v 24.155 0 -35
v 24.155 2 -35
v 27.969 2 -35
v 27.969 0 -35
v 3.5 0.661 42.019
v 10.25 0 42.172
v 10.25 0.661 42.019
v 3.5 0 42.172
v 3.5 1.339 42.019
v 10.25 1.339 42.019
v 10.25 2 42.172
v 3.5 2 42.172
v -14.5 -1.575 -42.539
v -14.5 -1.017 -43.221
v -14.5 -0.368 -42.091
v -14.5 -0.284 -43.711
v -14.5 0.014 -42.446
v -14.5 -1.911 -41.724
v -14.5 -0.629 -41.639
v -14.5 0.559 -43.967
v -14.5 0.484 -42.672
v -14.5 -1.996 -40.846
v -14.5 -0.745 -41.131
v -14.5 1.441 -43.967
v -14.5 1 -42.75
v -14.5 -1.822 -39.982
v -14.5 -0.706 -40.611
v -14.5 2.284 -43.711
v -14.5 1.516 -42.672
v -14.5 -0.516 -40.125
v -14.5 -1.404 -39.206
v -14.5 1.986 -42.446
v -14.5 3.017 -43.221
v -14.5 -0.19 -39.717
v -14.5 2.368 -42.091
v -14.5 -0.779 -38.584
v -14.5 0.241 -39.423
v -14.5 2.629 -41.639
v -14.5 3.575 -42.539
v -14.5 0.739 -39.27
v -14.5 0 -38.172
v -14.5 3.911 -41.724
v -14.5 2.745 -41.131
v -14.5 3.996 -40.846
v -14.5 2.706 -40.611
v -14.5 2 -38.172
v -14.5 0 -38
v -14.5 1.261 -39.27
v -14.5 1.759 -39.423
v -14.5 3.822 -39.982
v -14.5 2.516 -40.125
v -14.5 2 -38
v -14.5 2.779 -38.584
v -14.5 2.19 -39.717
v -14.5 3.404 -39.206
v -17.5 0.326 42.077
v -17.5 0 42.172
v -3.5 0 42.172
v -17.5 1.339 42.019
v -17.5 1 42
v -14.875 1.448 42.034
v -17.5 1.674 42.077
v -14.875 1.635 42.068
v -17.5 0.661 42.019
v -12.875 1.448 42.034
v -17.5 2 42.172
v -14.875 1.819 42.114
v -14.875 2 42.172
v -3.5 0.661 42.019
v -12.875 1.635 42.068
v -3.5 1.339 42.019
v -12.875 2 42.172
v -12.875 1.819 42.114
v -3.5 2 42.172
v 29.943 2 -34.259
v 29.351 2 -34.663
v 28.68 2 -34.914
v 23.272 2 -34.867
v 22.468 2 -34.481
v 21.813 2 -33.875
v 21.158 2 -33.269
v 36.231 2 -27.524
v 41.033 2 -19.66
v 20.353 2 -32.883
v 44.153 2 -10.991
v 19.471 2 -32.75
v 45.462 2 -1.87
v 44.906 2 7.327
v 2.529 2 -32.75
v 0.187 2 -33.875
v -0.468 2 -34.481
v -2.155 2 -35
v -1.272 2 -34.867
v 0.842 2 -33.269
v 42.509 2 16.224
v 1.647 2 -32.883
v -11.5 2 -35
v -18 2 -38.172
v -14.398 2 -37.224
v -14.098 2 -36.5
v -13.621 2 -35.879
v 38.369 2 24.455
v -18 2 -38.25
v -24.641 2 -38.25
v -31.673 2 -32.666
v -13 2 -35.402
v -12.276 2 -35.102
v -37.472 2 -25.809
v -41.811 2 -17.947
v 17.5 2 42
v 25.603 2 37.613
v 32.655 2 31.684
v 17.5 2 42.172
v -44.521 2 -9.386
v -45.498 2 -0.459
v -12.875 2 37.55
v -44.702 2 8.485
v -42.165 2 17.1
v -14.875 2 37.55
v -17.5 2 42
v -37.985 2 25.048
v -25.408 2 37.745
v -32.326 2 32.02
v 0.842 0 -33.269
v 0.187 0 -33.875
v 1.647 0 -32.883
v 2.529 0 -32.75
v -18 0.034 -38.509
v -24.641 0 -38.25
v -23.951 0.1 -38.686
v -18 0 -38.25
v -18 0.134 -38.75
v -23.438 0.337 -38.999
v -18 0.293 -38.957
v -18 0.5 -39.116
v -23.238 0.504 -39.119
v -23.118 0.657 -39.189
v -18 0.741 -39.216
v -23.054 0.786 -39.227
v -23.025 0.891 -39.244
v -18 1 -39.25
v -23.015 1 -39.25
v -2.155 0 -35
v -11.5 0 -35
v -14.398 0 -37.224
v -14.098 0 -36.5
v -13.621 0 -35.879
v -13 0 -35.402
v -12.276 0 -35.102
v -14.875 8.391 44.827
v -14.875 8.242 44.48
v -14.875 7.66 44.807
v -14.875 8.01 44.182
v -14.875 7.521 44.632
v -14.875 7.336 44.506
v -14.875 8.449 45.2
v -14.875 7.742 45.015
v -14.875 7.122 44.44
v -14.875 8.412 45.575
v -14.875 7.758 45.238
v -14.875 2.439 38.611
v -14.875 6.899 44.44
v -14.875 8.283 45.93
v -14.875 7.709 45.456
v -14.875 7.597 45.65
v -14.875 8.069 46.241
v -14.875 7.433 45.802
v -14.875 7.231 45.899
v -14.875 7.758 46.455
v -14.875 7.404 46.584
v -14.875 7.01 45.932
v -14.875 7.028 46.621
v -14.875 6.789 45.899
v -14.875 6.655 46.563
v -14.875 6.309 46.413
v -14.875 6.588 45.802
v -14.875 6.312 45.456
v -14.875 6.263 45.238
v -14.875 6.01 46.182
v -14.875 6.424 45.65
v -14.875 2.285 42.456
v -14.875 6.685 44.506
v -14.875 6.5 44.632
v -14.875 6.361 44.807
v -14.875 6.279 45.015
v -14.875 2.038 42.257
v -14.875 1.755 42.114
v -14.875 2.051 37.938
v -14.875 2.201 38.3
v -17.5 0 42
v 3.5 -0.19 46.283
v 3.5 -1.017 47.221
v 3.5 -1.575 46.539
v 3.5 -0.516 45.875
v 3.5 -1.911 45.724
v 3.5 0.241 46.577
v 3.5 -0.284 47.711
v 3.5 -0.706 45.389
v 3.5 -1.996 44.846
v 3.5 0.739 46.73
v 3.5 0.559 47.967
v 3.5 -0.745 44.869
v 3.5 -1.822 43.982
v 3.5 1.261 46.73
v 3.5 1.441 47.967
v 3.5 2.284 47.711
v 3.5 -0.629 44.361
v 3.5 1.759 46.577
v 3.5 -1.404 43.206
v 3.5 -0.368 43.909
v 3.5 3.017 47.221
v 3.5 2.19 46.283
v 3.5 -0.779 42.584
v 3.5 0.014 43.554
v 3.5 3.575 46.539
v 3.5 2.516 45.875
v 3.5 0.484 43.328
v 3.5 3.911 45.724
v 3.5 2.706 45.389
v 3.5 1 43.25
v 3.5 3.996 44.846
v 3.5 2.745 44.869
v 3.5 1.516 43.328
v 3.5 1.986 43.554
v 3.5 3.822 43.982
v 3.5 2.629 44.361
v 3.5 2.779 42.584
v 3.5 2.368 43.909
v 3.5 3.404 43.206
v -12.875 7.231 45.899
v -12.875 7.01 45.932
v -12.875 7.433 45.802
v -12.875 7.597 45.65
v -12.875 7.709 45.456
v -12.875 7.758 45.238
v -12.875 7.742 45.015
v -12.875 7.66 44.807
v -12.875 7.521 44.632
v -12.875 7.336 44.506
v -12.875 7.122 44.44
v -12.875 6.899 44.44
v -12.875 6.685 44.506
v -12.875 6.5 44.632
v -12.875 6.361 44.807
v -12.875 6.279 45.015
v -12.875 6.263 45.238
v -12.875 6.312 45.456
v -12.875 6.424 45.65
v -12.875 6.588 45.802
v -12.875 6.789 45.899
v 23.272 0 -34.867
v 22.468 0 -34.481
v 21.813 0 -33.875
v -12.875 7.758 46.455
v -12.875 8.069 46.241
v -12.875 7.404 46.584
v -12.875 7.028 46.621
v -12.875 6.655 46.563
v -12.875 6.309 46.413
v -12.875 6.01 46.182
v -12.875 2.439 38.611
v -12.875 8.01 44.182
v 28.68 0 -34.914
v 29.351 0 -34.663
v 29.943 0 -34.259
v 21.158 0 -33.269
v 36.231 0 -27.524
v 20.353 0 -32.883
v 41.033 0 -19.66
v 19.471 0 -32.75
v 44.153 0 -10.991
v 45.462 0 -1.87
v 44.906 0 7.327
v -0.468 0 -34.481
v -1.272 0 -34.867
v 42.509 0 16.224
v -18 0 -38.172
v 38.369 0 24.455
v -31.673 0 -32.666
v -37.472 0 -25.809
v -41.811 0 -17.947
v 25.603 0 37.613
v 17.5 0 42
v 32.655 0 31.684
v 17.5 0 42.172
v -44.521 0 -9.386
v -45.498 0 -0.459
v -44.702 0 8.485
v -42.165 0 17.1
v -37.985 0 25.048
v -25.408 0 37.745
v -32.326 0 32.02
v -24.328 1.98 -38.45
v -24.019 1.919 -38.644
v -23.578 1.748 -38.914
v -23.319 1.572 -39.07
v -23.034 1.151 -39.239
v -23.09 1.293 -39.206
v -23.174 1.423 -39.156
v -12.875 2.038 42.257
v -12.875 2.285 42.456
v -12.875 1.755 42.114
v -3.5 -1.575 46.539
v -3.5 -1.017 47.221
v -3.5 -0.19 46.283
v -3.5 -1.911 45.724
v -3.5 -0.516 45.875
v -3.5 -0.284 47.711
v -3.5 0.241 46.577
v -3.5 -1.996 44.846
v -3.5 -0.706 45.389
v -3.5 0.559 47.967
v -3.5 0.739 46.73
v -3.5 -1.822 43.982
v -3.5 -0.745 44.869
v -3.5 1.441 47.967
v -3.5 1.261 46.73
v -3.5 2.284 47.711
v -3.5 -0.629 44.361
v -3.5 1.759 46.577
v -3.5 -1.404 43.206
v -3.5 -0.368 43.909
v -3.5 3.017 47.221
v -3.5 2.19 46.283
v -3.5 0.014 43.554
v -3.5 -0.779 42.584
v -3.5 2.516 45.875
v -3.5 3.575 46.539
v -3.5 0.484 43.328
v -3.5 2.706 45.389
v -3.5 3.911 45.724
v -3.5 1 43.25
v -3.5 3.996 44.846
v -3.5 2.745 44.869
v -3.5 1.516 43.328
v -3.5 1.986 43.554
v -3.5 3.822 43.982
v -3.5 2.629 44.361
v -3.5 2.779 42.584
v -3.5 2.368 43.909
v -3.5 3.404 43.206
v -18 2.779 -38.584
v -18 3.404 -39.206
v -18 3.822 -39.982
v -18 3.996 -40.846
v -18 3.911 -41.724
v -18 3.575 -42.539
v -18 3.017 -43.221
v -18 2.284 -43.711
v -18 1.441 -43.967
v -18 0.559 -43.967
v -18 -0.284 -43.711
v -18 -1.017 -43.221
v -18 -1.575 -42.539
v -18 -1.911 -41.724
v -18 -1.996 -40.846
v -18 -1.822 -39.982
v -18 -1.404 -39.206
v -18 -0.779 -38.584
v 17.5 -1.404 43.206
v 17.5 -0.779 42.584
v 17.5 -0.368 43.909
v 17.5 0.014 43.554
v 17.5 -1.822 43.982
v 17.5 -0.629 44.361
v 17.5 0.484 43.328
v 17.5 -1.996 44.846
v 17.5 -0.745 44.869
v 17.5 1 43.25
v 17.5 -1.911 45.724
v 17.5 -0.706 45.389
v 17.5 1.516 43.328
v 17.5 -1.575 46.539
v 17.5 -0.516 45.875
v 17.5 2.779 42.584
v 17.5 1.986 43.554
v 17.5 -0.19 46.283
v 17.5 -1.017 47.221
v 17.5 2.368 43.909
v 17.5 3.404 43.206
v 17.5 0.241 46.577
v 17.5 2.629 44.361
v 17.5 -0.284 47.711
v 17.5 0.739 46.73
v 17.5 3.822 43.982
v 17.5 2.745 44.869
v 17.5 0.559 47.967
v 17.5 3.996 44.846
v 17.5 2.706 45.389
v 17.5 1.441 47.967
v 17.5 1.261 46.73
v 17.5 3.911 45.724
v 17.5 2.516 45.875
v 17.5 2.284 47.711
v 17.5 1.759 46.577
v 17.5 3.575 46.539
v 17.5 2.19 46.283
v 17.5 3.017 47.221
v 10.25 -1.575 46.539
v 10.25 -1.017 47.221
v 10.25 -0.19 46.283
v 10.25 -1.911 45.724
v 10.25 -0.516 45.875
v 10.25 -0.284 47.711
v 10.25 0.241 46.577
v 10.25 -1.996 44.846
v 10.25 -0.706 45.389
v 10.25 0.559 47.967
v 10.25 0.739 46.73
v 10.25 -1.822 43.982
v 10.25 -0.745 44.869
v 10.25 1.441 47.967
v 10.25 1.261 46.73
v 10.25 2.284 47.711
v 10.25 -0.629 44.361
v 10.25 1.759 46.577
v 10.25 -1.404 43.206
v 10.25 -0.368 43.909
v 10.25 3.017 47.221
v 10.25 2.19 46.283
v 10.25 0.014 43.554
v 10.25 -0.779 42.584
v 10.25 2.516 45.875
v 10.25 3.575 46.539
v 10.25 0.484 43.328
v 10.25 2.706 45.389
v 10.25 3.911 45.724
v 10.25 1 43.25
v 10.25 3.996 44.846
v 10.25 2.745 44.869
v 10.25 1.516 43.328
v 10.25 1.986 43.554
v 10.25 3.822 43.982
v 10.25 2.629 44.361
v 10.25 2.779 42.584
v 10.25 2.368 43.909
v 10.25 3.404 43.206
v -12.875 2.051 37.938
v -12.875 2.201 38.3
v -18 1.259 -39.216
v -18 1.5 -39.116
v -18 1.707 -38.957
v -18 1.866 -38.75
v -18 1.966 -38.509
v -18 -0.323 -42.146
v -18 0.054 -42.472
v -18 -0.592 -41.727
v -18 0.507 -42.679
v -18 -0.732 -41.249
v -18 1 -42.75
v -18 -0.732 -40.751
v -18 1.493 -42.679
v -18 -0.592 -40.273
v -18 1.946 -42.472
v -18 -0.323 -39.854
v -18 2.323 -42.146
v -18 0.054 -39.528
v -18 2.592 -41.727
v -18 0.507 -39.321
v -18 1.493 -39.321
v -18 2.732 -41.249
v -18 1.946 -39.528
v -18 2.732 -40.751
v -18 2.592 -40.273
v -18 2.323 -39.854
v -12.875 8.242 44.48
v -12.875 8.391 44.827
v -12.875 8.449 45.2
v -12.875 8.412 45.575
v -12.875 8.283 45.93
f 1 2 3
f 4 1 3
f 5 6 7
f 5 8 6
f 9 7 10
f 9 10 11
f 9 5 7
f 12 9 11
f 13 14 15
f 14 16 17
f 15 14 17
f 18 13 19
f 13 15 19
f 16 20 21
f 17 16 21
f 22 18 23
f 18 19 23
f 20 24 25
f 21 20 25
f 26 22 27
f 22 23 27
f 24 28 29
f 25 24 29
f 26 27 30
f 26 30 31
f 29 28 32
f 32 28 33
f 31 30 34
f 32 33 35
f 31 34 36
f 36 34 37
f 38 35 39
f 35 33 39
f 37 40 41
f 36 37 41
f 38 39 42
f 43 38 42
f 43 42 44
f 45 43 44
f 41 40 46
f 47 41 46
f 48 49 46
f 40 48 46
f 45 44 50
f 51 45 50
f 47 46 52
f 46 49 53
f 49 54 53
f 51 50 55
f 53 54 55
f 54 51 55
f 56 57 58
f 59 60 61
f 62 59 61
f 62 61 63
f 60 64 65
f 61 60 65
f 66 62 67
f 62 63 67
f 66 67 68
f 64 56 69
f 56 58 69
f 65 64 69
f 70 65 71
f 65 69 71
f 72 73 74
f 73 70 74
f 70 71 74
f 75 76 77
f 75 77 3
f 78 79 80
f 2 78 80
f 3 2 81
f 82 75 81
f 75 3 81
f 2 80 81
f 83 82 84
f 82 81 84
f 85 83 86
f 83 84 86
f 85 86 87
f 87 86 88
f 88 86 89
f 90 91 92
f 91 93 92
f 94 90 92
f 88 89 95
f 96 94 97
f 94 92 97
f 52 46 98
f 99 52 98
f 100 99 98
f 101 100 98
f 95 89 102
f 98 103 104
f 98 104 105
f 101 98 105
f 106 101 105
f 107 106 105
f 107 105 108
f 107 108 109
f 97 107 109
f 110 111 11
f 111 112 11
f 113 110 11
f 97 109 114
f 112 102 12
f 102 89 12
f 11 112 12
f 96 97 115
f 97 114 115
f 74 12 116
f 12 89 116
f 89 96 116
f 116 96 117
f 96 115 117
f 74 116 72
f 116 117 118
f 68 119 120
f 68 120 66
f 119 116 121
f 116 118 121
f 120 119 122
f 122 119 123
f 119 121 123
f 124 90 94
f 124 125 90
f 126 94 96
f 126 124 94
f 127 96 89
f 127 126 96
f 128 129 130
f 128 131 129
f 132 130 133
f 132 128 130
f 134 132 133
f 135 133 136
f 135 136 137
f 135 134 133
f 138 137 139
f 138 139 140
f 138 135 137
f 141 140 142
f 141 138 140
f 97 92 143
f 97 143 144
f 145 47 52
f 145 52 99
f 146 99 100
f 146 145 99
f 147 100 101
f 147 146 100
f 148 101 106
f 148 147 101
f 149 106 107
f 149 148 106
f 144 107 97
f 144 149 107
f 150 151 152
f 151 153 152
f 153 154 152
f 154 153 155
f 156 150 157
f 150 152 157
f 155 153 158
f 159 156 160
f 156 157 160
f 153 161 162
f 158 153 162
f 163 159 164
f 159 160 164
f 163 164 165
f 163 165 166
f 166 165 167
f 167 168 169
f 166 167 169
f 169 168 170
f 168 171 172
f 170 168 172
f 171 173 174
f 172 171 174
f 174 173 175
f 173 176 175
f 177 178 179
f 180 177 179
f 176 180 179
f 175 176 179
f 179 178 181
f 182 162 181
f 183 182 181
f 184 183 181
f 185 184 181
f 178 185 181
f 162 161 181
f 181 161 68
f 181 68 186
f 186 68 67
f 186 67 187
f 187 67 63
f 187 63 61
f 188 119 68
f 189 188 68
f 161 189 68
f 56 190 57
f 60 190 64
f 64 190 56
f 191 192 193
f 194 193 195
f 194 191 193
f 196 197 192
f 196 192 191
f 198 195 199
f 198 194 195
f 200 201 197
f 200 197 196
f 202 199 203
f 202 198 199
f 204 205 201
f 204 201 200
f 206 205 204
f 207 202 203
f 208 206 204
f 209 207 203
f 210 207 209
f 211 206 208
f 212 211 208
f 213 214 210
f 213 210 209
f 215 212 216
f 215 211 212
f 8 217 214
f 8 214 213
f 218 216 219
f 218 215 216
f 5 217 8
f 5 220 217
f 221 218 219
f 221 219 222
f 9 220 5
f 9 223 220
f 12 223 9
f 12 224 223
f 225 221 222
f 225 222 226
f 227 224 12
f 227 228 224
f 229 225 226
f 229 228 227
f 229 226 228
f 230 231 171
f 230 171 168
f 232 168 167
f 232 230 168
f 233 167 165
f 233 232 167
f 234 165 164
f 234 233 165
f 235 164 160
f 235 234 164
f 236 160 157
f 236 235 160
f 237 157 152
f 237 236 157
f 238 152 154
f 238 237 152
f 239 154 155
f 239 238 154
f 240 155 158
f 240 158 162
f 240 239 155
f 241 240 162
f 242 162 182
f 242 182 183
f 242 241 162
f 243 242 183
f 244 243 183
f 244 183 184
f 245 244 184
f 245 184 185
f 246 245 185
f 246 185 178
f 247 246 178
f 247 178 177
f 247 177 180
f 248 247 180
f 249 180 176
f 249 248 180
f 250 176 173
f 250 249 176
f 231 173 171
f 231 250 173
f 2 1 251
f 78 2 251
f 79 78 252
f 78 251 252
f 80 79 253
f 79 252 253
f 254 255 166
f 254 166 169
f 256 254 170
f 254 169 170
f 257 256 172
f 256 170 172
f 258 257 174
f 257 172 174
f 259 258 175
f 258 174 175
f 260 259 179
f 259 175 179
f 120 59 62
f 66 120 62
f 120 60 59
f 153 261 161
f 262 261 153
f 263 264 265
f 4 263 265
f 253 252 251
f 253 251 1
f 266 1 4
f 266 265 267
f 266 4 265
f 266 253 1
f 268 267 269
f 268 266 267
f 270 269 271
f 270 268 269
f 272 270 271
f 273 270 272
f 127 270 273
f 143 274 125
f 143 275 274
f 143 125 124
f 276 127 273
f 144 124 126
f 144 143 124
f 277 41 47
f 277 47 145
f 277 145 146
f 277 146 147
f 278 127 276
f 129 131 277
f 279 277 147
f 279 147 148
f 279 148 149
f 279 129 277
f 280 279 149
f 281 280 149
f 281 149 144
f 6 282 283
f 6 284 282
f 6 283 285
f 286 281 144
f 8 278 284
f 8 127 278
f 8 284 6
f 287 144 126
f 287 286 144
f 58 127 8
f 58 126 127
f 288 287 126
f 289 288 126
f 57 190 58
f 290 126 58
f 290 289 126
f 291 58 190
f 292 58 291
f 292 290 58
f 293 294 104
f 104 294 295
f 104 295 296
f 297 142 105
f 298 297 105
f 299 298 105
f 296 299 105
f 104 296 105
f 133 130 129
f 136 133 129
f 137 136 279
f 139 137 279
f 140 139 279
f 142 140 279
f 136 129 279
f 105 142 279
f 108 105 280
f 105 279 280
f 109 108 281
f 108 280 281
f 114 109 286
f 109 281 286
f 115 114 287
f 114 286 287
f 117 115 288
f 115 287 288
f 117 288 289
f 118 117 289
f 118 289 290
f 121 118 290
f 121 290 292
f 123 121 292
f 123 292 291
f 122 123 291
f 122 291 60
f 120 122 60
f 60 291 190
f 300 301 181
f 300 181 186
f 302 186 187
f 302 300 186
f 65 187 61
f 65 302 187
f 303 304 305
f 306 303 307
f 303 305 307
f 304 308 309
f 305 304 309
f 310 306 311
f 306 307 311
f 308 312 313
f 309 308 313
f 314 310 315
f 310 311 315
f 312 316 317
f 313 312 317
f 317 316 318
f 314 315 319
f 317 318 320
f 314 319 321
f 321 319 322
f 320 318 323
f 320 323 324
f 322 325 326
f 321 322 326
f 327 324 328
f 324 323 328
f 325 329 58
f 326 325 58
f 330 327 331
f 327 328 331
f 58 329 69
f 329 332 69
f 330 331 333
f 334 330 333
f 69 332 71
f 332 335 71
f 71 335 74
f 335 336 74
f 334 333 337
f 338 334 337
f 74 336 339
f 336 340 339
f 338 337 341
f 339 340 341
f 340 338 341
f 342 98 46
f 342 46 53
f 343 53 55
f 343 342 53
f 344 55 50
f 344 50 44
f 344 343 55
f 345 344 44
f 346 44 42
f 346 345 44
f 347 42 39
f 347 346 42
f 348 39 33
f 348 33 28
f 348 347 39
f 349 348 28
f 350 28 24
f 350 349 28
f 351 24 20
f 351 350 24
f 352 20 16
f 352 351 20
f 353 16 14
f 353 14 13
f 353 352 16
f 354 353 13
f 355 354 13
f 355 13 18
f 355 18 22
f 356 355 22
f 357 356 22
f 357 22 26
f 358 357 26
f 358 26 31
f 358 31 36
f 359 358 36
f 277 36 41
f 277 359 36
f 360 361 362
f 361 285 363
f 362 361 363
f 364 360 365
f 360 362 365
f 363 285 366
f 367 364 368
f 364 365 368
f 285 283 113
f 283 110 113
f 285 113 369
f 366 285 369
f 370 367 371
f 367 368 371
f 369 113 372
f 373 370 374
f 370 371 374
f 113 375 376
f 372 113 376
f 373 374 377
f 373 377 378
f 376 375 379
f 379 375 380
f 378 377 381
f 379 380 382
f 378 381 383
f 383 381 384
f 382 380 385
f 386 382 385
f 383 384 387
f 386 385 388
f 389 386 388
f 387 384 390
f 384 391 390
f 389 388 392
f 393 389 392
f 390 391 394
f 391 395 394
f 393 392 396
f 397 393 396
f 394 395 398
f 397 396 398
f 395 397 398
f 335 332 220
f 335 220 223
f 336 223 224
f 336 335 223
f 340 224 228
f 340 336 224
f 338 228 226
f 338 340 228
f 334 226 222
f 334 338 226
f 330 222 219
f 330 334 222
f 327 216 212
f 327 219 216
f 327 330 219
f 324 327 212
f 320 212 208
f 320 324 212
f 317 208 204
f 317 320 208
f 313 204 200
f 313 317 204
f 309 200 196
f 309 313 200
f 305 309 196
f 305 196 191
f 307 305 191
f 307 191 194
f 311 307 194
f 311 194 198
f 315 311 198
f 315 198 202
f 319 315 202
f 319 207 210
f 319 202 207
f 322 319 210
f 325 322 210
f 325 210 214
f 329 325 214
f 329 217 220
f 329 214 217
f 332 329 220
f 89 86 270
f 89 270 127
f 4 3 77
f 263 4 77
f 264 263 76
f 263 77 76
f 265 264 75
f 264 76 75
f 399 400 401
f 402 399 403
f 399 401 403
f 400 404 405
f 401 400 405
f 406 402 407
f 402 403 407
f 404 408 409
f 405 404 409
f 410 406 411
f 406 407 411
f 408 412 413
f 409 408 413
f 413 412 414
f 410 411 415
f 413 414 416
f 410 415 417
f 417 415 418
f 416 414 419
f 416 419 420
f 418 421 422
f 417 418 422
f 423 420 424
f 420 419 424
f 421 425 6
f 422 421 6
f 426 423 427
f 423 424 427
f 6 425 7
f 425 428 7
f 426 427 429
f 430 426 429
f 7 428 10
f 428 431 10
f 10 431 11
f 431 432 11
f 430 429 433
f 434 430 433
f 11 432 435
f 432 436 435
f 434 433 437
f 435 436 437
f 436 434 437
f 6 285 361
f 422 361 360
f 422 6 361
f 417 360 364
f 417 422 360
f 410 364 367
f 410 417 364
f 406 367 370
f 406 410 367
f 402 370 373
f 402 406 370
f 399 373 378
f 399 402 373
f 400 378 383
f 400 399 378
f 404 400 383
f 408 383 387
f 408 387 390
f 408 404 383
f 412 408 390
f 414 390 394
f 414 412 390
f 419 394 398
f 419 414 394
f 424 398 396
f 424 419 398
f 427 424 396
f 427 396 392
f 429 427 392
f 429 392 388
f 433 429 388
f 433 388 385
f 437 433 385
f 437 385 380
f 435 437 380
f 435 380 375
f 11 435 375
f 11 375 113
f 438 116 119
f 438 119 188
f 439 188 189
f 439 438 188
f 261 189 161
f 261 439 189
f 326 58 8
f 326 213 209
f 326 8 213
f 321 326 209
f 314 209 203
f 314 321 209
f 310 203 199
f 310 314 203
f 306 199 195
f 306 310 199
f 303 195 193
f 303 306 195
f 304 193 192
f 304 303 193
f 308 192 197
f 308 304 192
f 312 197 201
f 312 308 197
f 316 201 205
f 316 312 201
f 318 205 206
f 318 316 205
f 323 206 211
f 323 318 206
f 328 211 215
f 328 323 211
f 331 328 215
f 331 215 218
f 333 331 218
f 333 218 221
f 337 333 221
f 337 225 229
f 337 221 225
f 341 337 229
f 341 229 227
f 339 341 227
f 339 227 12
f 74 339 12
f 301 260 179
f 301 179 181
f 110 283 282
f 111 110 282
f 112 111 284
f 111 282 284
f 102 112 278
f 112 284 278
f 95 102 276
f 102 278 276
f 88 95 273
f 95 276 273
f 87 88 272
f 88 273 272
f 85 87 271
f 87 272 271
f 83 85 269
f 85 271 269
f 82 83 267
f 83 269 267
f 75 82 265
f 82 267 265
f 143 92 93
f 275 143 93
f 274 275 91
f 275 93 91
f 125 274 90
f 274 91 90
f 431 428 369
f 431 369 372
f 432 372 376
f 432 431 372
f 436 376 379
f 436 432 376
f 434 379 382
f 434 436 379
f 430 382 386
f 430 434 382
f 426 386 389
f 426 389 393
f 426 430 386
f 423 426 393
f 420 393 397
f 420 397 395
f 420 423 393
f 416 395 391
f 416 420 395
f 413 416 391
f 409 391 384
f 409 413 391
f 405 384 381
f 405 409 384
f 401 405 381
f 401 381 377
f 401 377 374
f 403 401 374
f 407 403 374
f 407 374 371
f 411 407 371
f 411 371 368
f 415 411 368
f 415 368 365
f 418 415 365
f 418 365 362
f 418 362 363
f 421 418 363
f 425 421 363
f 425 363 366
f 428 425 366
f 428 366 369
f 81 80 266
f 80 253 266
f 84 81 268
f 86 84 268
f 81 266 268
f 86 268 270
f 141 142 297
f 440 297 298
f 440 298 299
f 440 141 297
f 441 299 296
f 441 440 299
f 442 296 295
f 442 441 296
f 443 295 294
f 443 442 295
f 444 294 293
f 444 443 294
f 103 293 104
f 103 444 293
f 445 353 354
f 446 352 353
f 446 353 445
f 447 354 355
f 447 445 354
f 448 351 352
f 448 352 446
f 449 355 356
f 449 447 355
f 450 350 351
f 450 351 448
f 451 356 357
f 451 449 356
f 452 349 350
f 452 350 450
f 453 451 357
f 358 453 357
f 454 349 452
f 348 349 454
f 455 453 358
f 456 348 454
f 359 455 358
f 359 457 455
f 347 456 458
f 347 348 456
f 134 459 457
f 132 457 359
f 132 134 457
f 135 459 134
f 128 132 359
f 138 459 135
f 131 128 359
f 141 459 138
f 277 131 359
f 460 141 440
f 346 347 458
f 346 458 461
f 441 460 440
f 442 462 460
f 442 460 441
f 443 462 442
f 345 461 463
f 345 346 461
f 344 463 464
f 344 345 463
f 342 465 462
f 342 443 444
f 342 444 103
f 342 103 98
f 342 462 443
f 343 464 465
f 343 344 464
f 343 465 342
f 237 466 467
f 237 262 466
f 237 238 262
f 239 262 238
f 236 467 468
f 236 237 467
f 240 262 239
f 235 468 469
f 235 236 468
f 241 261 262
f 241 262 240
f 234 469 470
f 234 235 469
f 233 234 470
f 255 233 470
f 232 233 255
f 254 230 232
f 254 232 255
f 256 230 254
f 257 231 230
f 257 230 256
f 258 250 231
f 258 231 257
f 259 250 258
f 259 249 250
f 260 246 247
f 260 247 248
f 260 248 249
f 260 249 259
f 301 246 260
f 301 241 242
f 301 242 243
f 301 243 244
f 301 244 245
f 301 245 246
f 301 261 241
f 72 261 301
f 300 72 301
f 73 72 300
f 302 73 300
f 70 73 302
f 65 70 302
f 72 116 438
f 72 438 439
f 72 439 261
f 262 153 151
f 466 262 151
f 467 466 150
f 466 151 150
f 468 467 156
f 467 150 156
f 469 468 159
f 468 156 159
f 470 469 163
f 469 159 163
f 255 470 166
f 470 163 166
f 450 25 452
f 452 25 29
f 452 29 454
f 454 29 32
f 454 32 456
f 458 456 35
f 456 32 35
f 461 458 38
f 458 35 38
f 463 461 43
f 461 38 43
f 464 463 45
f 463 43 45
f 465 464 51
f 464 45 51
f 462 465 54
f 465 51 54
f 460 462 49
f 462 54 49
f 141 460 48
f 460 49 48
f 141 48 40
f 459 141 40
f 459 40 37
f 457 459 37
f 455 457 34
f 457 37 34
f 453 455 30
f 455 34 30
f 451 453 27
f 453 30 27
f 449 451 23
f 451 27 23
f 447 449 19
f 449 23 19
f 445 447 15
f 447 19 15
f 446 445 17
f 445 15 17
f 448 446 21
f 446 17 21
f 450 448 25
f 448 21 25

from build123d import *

# Parameters (mm, degrees)
BOSS_EXTRUDE1_DEPTH            = 2
BOSS_EXTRUDE2_DEPTH            = 17.5
BOSS_EXTRUDE2_DEPTH_BACK       = 17.5
SKETCH2_R                      = 1.7500000000000036
SKETCH3_R                      = 2.999999999999994
CUT_EXTRUDE1_DEPTH             = 6.75
CUT_EXTRUDE2_DEPTH             = 2
BOSS_EXTRUDE4_DEPTH            = 3
BOSS_EXTRUDE4_DEPTH_BACK       = 0.5
SKETCH6_R                      = 1.7500000000000036
CUT_EXTRUDE3_DEPTH             = 77.9415362466854
FILLET1_R                      = 1
SKETCH7_W                      = 9
SKETCH7_H                      = 6
CUT_EXTRUDE4_DEPTH             = 2
FILLET2_R                      = 3
FILLET3_R                      = 3
CUT_EXTRUDE5_REACH             = 78.455
SKETCH10_R                     = 2.999999999999994
CUT_EXTRUDE5_DIRECTION_2_REACH = 78.455
BOSS_EXTRUDE6_DEPTH            = 1
BOSS_EXTRUDE6_DEPTH_BACK       = 1
SKETCH11_R                     = 0.7499999999999987
FILLET5_R                      = 1.5


# Some blends are built 0.0001 mm under size
with BuildPart() as part:
    # Sketch1 → Boss-Extrude1 (new body)
    with BuildSketch(Plane(origin=(0, 0, 0), x_dir=(1, 0, 0), z_dir=(0, 1, 0))):
        with BuildLine():
            Line((-17.499999999999993, -42), (17.499999999999993, -42))
            ThreePointArc((17.499999999999993, -42), (45.5, 1.01e-14), (17.499999999999975, 42.00000000000001))
            Line((17.499999999999975, 42.00000000000001), (-17.499999999999975, 42.00000000000001))
            ThreePointArc((-17.499999999999975, 42.00000000000001), (-45.5, 5.57e-15), (-17.499999999999993, -42))
        make_face()
    extrude(amount=BOSS_EXTRUDE1_DEPTH)

    # Sketch2 → Boss-Extrude2 (add, two sides: drawn at the far end of the back side and taken through both)
    with BuildSketch(Plane(origin=(0, 0, 0), x_dir=(0, 0, -1), z_dir=(1, 0, 0)).offset(-BOSS_EXTRUDE2_DEPTH_BACK)):
        with BuildLine():
            Line((-42, 0), (-42.171572875253815, 0))
            ThreePointArc((-42.171572875253815, 0), (-48.00000000000001, 1.0000000000000004), (-42.171572875253815, 2))
            Line((-42.171572875253815, 2), (-42, 2))
            Line((-42, 2), (-42, 1))
            Line((-42, 1), (-42, 0))
        make_face()
        with Locations((-45.00000000000001, 1)):
            Circle(SKETCH2_R, mode=Mode.SUBTRACT)
    extrude(amount=BOSS_EXTRUDE2_DEPTH + BOSS_EXTRUDE2_DEPTH_BACK)

    # Sketch3 → Cut-Extrude1 (cut)
    with BuildSketch(Plane(origin=(3.5, 0, 0), x_dir=(0, 0, -1), z_dir=(1, 0, 0))):
        with Locations((-45.00000000000001, 1)):
            Circle(SKETCH3_R)
    cut_extrude1 = extrude(amount=CUT_EXTRUDE1_DEPTH, mode=Mode.SUBTRACT)

    # Mirror1: Cut-Extrude1 across plane
    add(cut_extrude1.mirror(Plane(origin=(0, 0, 0), x_dir=(0, 0, 1), z_dir=(1, 0, 0))), mode=Mode.SUBTRACT)

    # Sketch4 → Cut-Extrude2 (cut)
    with BuildSketch(Plane(origin=(0, 2, 0), x_dir=(1, 0, 0), z_dir=(0, 1, 0))):
        Polygon((0.7499999999999764, 42.00000000000001), (21.249999999999982, 42.00000000000001), (21.24999999999998, 32.75000000000001), (0.7499999999999775, 32.75000000000001), (0.7499999999999781, 35.00000000000001), (-17.50000000000002, 35.00000000000001), (-17.50000000000002, 42.00000000000001), align=None)
    extrude(amount=-CUT_EXTRUDE2_DEPTH, mode=Mode.SUBTRACT)

    # Sketch5 → Boss-Extrude4 (add, two sides: drawn at the far end of the back side and taken through both)
    with BuildSketch(Plane(origin=(-17.50000000000002, 0, 0), x_dir=(0, 0, -1), z_dir=(1, 0, 0)).offset(-BOSS_EXTRUDE4_DEPTH_BACK)):
        with BuildLine():
            Line((35.00000000000001, 1), (35.00000000000001, 2))
            Line((35.00000000000001, 2), (38.171572875253815, 2))
            ThreePointArc((38.171572875253815, 2), (44.00000000000001, 1), (38.171572875253815, 0))
            Line((38.171572875253815, 0), (35.00000000000001, 0))
            Line((35.00000000000001, 0), (35.00000000000001, 1))
        make_face()
    extrude(amount=BOSS_EXTRUDE4_DEPTH + BOSS_EXTRUDE4_DEPTH_BACK)

    # Sketch6 → Cut-Extrude3 (cut, through all)
    with BuildSketch(Plane(origin=(-14.500000000000023, 0, 0), x_dir=(0, 0, -1), z_dir=(1, 0, 0))):
        with Locations((41.00000000000001, 1)):
            Circle(SKETCH6_R)
    extrude(amount=-CUT_EXTRUDE3_DEPTH, mode=Mode.SUBTRACT)

    # Fillet1
    fillet1_edges = [part.edges().sort_by_distance(p)[0] for p in [
        (-20.23555777714238, 0, -39.563859338365496),
        (-20.23555777714238, 2, -39.563859338365496),
    ]]
    fillet(fillet1_edges, radius=FILLET1_R - 0.0001)  # a hair under: the kernel refuses the full size

    # Sketch7 → Cut-Extrude4 (cut)
    with BuildSketch(Plane(origin=(0, 2, 0), x_dir=(1, 0, 0), z_dir=(0, 1, 0))):
        with Locations((24.749999999999975, 38.00000000000001)):
            Rectangle(SKETCH7_W, SKETCH7_H)
    extrude(amount=-CUT_EXTRUDE4_DEPTH, mode=Mode.SUBTRACT)

    # Fillet2
    # the kernel refuses this fillet: 3 mm, written as the material it adds along each edge
    with BuildSketch(Plane(origin=(-14.500000000000021, 0, -35.00000000000001), x_dir=(0, 0, -1), z_dir=(0, 1, 0))) as fillet2_piece_1:
        with BuildLine():
            CenterArc((FILLET2_R, -FILLET2_R), FILLET2_R, 90, 90)
            Line((0, -FILLET2_R), (0, 0))
            Line((0, 0), (FILLET2_R, 0))
        make_face()
    extrude(amount=2)
    # the kernel refuses this fillet: 3 mm, written as the material it takes off along each edge
    with BuildSketch(Plane(origin=(29.07318352021326, 4.856917413714078, -35.00000000000001), x_dir=(-1, 0, 0), z_dir=(0, -1, 0))) as fillet2_2_piece_1:
        with BuildLine():
            CenterArc((1.1044509783192602, -3), FILLET2_R, 90, 41.154201960072044)
            ThreePointArc((-0.8698124952261921, -0.7411764705882291), (-0.43723324041952694, -0.3678573776648406), (0, 0))
            Line((0, 0), (1.1044509783192602, 0))
        make_face()
    extrude(amount=7.7138348274281565, mode=Mode.SUBTRACT)
    with BuildSketch(Plane(origin=(21.24999999999998, -7.261843774138903, -35.00000000000001), x_dir=(0, 0, 1), z_dir=(0, 1, 0))) as fillet2_2_piece_2:
        with BuildLine():
            CenterArc((3, 2.904737509655561), FILLET2_R, 180, 75.52248781407008)
            Line((0, 2.904737509655561), (0, 0))
            Line((0, 0), (2.25, 0))
        make_face()
    extrude(amount=16.523687548277806, mode=Mode.SUBTRACT)
    with BuildSketch(Plane(origin=(0.7499999999999781, 9.261843774138908, -35.00000000000001), x_dir=(-1, 0, 0), z_dir=(0, -1, 0))) as fillet2_2_piece_3:
        with BuildLine():
            CenterArc((2.9047375096555634, -3), FILLET2_R, 90, 75.5224878140701)
            Line((7.8e-16, -2.25), (0, 0))
            Line((0, 0), (2.9047375096555634, 0))
        make_face()
    extrude(amount=16.523687548277817, mode=Mode.SUBTRACT)

    # Fillet3
    fillet3_edges = [part.edges().sort_by_distance(p)[0] for p in [
        (21.24999999999998, 1, -32.75000000000001),
        (0.7499999999999775, 1, -32.75000000000001),
    ]]
    fillet(fillet3_edges, radius=FILLET3_R)

    # Cut-Extrude5: up to this face of the body (flat: up to its plane)
    cut_extrude5_end = Plane(part.part.faces().sort_by_distance((-10.25, 1, 42.084852814))[0])
    # Sketch10 → Cut-Extrude5 (cut, up to the picked face)
    with BuildSketch(Plane.ZY.offset(13.874999999999995), mode=Mode.PRIVATE) as cut_extrude5_sk1:
        with Locations((45.00000000000001, 1)):
            Circle(SKETCH10_R)
    cut_extrude5_tool1 = split(extrude(cut_extrude5_sk1.sketch, amount=-CUT_EXTRUDE5_REACH, mode=Mode.PRIVATE), bisect_by=cut_extrude5_end, keep=Keep.BOTH, mode=Mode.PRIVATE)
    add(cut_extrude5_tool1.solids().sort_by(Axis((-13.875, 1, 45), (1, 0, 0)))[0], mode=Mode.SUBTRACT)

    # Cut-Extrude5 direction 2: up to this face of the body (flat: up to its plane)
    cut_extrude5_direction_2_end = Plane(part.part.faces().sort_by_distance((-17.5, 1.915147186, 42.085786438))[0])
    # Sketch10 → Cut-Extrude5 direction 2 (cut, up to the picked face)
    with BuildSketch(Plane.ZY.offset(13.874999999999995), mode=Mode.PRIVATE) as cut_extrude5_direction_2_sk1:
        with Locations((45.00000000000001, 1)):
            Circle(SKETCH10_R)
    cut_extrude5_direction_2_tool1 = split(extrude(cut_extrude5_direction_2_sk1.sketch, amount=CUT_EXTRUDE5_DIRECTION_2_REACH, mode=Mode.PRIVATE), bisect_by=cut_extrude5_direction_2_end, keep=Keep.BOTH, mode=Mode.PRIVATE)
    add(cut_extrude5_direction_2_tool1.solids().sort_by(Axis((-13.875, 1, 45), (-1, 0, 0)))[0], mode=Mode.SUBTRACT)

    # Sketch11 → Boss-Extrude6 (add, two sides: drawn at the far end of the back side and taken through both)
    with BuildSketch(Plane.ZY.offset(13.874999999999995).offset(-BOSS_EXTRUDE6_DEPTH_BACK)):
        Polygon((38.171572875253815, 2), (45.24264068711927, 9.07106781186549), (47.242640687119284, 7.071067811865485), (42.171572875253815, 2), align=None)
        with Locations((45.18198051533946, 7.010407640085664)):
            Circle(SKETCH11_R, mode=Mode.SUBTRACT)
    extrude(amount=BOSS_EXTRUDE6_DEPTH + BOSS_EXTRUDE6_DEPTH_BACK)

    # Fillet5
    # the kernel refuses this fillet: 1.5 mm, written as the material it adds along each edge
    with BuildSketch(Plane(origin=(-12.874999999999995, 2, 42.171572875253815), x_dir=(0, -0.9701770324837726, -0.24239745386653885), z_dir=(-1, 0, 0))) as fillet5_piece_1:
        with BuildLine():
            CenterArc((0.42686024849732124, 1.4932362441747078), FILLET5_R, 239.02808334302642, 36.41505394843642)
            Line((-0.3450665643766781, 0.2071067811865567), (0, 0))
            ThreePointArc((0, 0), (0.284573498998202, -0.01352751165058759), (0.5691469979964033, 2e-17))
        make_face()
    extrude(amount=2)
    with BuildSketch(Plane(origin=(-12.874999999999995, 2, 38.171572875253815), x_dir=(0, 0, -1), z_dir=(-1, 0, 0))) as fillet5_piece_2:
        with BuildLine():
            CenterArc((FILLET5_R * 0.414213562373, -FILLET5_R), FILLET5_R, 90, 45.000000000000085)
            Line((-FILLET5_R * 0.292893218813, -FILLET5_R * 0.292893218813), (0, 0))
            Line((0, 0), (FILLET5_R * 0.414213562373, 0))
        make_face()
    extrude(amount=2)
    # the kernel refuses this fillet: 1.5 mm, written as the material it takes off along each edge
    with BuildSketch(Plane(origin=(-18.625000000000014, 7.071067811865485, 47.242640687119284), x_dir=(0, 0.7071067811865455, -0.7071067811865496), z_dir=(1, 0, 0))) as fillet5_2_piece_1:
        with BuildLine():
            CenterArc((FILLET5_R, -FILLET5_R), FILLET5_R, 89.9999999999999, 90.00000000000017)
            Line((4.98e-15, -FILLET5_R), (0, 0))
            Line((0, 0), (FILLET5_R, 2e-17))
        make_face()
    extrude(amount=9.500000000000039, mode=Mode.SUBTRACT)
    with BuildSketch(Plane(origin=(-18.62499999999999, 9.07106781186549, 45.24264068711927), x_dir=(0, -0.7071067811865499, -0.7071067811865451), z_dir=(1, 0, 0))) as fillet5_2_piece_2:
        with BuildLine():
            CenterArc((FILLET5_R, -FILLET5_R), FILLET5_R, 90.0000000000001, 89.99999999999984)
            Line((1.28e-15, -FILLET5_R), (0, 0))
            Line((0, 0), (FILLET5_R, 9e-17))
        make_face()
    extrude(amount=9.49999999999999, mode=Mode.SUBTRACT)


solid = part.part
